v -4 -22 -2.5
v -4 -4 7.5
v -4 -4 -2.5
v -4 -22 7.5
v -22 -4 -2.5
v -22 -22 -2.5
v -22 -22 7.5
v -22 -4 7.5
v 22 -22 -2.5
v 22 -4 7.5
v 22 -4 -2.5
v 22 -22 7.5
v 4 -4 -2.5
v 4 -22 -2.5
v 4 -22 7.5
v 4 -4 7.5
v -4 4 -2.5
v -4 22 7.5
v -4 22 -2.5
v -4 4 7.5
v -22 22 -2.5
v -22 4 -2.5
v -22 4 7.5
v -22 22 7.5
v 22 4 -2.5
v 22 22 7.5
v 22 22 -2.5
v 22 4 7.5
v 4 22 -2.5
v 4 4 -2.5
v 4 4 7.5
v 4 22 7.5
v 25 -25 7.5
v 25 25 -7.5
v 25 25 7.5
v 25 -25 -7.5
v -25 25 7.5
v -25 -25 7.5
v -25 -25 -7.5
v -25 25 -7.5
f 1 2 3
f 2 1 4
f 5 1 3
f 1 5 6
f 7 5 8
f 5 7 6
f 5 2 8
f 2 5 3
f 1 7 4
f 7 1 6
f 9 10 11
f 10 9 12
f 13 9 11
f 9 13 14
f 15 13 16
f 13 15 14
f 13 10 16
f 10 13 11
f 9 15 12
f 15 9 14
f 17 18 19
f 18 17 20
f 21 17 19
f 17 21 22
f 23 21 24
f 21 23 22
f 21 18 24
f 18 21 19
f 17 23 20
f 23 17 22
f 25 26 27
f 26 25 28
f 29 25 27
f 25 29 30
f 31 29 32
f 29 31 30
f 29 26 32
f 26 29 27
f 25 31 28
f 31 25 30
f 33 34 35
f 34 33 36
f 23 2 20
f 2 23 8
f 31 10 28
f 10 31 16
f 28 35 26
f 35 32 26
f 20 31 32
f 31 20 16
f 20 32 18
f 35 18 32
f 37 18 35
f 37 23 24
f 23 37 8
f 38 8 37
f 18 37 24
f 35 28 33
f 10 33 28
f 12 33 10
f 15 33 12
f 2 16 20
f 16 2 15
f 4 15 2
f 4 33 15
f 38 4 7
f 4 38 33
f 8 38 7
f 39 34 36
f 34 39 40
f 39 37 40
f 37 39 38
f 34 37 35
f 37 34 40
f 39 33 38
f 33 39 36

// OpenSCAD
$fn = 32;

// ----------------------------------------------------------------------
// Pocket plate 50 x 50 x 15
// 2 x 2 pockets 18 mm square, 10 mm deep
// ----------------------------------------------------------------------

// --- parameters (mm) ---
thickness = 15;   // plate thickness
seat_tol = 0.05;  // tolerance at the seating features
free_tol = 0.3;   // general tolerance on the free sizes
floor_t = 5;      // material left under each pocket
pocket = 18;      // pocket side length
pitch_x = 26;     // pocket pitch along X
pitch_y = 26;     // pocket pitch along Y
cols = 2;         // pockets per row
rows = 2;         // rows of pockets

// --- derived feature positions (mm) ---
depth = thickness - floor_t;        // = 10   pocket depth, down to the floor
span_x = (cols - 1) * pitch_x;      // = 26   distance between outer pockets
span_y = (rows - 1) * pitch_y;      // = 26   distance between outer pocket rows
origin_x = -span_x / 2;             // = -13   X of the first pocket
origin_y = -span_y / 2;             // = -13   Y of the first pocket
plate = [span_x + pocket + 6, span_y + pocket + 6, thickness];  // = [50, 50, 15]   overall size: pockets plus 3 mm of wall on each side
feature_centers = [
  [origin_x + 0 * pitch_x, origin_y + 0 * pitch_y],
  [origin_x + 1 * pitch_x, origin_y + 0 * pitch_y],
  [origin_x + 0 * pitch_x, origin_y + 1 * pitch_y],
  [origin_x + 1 * pitch_x, origin_y + 1 * pitch_y]
];   // pocket centres, used verbatim by the cutter loop

// plate outline, then one pocket per centre in feature_centers
difference() {
  cube(plate, center = true);
  for (centre = feature_centers)
    translate([centre[0] - pocket / 2, centre[1] - pocket / 2, plate[2] / 2 - depth])
      cube([pocket, pocket, depth + 1]);  // centred on the declared pocket centre
}
